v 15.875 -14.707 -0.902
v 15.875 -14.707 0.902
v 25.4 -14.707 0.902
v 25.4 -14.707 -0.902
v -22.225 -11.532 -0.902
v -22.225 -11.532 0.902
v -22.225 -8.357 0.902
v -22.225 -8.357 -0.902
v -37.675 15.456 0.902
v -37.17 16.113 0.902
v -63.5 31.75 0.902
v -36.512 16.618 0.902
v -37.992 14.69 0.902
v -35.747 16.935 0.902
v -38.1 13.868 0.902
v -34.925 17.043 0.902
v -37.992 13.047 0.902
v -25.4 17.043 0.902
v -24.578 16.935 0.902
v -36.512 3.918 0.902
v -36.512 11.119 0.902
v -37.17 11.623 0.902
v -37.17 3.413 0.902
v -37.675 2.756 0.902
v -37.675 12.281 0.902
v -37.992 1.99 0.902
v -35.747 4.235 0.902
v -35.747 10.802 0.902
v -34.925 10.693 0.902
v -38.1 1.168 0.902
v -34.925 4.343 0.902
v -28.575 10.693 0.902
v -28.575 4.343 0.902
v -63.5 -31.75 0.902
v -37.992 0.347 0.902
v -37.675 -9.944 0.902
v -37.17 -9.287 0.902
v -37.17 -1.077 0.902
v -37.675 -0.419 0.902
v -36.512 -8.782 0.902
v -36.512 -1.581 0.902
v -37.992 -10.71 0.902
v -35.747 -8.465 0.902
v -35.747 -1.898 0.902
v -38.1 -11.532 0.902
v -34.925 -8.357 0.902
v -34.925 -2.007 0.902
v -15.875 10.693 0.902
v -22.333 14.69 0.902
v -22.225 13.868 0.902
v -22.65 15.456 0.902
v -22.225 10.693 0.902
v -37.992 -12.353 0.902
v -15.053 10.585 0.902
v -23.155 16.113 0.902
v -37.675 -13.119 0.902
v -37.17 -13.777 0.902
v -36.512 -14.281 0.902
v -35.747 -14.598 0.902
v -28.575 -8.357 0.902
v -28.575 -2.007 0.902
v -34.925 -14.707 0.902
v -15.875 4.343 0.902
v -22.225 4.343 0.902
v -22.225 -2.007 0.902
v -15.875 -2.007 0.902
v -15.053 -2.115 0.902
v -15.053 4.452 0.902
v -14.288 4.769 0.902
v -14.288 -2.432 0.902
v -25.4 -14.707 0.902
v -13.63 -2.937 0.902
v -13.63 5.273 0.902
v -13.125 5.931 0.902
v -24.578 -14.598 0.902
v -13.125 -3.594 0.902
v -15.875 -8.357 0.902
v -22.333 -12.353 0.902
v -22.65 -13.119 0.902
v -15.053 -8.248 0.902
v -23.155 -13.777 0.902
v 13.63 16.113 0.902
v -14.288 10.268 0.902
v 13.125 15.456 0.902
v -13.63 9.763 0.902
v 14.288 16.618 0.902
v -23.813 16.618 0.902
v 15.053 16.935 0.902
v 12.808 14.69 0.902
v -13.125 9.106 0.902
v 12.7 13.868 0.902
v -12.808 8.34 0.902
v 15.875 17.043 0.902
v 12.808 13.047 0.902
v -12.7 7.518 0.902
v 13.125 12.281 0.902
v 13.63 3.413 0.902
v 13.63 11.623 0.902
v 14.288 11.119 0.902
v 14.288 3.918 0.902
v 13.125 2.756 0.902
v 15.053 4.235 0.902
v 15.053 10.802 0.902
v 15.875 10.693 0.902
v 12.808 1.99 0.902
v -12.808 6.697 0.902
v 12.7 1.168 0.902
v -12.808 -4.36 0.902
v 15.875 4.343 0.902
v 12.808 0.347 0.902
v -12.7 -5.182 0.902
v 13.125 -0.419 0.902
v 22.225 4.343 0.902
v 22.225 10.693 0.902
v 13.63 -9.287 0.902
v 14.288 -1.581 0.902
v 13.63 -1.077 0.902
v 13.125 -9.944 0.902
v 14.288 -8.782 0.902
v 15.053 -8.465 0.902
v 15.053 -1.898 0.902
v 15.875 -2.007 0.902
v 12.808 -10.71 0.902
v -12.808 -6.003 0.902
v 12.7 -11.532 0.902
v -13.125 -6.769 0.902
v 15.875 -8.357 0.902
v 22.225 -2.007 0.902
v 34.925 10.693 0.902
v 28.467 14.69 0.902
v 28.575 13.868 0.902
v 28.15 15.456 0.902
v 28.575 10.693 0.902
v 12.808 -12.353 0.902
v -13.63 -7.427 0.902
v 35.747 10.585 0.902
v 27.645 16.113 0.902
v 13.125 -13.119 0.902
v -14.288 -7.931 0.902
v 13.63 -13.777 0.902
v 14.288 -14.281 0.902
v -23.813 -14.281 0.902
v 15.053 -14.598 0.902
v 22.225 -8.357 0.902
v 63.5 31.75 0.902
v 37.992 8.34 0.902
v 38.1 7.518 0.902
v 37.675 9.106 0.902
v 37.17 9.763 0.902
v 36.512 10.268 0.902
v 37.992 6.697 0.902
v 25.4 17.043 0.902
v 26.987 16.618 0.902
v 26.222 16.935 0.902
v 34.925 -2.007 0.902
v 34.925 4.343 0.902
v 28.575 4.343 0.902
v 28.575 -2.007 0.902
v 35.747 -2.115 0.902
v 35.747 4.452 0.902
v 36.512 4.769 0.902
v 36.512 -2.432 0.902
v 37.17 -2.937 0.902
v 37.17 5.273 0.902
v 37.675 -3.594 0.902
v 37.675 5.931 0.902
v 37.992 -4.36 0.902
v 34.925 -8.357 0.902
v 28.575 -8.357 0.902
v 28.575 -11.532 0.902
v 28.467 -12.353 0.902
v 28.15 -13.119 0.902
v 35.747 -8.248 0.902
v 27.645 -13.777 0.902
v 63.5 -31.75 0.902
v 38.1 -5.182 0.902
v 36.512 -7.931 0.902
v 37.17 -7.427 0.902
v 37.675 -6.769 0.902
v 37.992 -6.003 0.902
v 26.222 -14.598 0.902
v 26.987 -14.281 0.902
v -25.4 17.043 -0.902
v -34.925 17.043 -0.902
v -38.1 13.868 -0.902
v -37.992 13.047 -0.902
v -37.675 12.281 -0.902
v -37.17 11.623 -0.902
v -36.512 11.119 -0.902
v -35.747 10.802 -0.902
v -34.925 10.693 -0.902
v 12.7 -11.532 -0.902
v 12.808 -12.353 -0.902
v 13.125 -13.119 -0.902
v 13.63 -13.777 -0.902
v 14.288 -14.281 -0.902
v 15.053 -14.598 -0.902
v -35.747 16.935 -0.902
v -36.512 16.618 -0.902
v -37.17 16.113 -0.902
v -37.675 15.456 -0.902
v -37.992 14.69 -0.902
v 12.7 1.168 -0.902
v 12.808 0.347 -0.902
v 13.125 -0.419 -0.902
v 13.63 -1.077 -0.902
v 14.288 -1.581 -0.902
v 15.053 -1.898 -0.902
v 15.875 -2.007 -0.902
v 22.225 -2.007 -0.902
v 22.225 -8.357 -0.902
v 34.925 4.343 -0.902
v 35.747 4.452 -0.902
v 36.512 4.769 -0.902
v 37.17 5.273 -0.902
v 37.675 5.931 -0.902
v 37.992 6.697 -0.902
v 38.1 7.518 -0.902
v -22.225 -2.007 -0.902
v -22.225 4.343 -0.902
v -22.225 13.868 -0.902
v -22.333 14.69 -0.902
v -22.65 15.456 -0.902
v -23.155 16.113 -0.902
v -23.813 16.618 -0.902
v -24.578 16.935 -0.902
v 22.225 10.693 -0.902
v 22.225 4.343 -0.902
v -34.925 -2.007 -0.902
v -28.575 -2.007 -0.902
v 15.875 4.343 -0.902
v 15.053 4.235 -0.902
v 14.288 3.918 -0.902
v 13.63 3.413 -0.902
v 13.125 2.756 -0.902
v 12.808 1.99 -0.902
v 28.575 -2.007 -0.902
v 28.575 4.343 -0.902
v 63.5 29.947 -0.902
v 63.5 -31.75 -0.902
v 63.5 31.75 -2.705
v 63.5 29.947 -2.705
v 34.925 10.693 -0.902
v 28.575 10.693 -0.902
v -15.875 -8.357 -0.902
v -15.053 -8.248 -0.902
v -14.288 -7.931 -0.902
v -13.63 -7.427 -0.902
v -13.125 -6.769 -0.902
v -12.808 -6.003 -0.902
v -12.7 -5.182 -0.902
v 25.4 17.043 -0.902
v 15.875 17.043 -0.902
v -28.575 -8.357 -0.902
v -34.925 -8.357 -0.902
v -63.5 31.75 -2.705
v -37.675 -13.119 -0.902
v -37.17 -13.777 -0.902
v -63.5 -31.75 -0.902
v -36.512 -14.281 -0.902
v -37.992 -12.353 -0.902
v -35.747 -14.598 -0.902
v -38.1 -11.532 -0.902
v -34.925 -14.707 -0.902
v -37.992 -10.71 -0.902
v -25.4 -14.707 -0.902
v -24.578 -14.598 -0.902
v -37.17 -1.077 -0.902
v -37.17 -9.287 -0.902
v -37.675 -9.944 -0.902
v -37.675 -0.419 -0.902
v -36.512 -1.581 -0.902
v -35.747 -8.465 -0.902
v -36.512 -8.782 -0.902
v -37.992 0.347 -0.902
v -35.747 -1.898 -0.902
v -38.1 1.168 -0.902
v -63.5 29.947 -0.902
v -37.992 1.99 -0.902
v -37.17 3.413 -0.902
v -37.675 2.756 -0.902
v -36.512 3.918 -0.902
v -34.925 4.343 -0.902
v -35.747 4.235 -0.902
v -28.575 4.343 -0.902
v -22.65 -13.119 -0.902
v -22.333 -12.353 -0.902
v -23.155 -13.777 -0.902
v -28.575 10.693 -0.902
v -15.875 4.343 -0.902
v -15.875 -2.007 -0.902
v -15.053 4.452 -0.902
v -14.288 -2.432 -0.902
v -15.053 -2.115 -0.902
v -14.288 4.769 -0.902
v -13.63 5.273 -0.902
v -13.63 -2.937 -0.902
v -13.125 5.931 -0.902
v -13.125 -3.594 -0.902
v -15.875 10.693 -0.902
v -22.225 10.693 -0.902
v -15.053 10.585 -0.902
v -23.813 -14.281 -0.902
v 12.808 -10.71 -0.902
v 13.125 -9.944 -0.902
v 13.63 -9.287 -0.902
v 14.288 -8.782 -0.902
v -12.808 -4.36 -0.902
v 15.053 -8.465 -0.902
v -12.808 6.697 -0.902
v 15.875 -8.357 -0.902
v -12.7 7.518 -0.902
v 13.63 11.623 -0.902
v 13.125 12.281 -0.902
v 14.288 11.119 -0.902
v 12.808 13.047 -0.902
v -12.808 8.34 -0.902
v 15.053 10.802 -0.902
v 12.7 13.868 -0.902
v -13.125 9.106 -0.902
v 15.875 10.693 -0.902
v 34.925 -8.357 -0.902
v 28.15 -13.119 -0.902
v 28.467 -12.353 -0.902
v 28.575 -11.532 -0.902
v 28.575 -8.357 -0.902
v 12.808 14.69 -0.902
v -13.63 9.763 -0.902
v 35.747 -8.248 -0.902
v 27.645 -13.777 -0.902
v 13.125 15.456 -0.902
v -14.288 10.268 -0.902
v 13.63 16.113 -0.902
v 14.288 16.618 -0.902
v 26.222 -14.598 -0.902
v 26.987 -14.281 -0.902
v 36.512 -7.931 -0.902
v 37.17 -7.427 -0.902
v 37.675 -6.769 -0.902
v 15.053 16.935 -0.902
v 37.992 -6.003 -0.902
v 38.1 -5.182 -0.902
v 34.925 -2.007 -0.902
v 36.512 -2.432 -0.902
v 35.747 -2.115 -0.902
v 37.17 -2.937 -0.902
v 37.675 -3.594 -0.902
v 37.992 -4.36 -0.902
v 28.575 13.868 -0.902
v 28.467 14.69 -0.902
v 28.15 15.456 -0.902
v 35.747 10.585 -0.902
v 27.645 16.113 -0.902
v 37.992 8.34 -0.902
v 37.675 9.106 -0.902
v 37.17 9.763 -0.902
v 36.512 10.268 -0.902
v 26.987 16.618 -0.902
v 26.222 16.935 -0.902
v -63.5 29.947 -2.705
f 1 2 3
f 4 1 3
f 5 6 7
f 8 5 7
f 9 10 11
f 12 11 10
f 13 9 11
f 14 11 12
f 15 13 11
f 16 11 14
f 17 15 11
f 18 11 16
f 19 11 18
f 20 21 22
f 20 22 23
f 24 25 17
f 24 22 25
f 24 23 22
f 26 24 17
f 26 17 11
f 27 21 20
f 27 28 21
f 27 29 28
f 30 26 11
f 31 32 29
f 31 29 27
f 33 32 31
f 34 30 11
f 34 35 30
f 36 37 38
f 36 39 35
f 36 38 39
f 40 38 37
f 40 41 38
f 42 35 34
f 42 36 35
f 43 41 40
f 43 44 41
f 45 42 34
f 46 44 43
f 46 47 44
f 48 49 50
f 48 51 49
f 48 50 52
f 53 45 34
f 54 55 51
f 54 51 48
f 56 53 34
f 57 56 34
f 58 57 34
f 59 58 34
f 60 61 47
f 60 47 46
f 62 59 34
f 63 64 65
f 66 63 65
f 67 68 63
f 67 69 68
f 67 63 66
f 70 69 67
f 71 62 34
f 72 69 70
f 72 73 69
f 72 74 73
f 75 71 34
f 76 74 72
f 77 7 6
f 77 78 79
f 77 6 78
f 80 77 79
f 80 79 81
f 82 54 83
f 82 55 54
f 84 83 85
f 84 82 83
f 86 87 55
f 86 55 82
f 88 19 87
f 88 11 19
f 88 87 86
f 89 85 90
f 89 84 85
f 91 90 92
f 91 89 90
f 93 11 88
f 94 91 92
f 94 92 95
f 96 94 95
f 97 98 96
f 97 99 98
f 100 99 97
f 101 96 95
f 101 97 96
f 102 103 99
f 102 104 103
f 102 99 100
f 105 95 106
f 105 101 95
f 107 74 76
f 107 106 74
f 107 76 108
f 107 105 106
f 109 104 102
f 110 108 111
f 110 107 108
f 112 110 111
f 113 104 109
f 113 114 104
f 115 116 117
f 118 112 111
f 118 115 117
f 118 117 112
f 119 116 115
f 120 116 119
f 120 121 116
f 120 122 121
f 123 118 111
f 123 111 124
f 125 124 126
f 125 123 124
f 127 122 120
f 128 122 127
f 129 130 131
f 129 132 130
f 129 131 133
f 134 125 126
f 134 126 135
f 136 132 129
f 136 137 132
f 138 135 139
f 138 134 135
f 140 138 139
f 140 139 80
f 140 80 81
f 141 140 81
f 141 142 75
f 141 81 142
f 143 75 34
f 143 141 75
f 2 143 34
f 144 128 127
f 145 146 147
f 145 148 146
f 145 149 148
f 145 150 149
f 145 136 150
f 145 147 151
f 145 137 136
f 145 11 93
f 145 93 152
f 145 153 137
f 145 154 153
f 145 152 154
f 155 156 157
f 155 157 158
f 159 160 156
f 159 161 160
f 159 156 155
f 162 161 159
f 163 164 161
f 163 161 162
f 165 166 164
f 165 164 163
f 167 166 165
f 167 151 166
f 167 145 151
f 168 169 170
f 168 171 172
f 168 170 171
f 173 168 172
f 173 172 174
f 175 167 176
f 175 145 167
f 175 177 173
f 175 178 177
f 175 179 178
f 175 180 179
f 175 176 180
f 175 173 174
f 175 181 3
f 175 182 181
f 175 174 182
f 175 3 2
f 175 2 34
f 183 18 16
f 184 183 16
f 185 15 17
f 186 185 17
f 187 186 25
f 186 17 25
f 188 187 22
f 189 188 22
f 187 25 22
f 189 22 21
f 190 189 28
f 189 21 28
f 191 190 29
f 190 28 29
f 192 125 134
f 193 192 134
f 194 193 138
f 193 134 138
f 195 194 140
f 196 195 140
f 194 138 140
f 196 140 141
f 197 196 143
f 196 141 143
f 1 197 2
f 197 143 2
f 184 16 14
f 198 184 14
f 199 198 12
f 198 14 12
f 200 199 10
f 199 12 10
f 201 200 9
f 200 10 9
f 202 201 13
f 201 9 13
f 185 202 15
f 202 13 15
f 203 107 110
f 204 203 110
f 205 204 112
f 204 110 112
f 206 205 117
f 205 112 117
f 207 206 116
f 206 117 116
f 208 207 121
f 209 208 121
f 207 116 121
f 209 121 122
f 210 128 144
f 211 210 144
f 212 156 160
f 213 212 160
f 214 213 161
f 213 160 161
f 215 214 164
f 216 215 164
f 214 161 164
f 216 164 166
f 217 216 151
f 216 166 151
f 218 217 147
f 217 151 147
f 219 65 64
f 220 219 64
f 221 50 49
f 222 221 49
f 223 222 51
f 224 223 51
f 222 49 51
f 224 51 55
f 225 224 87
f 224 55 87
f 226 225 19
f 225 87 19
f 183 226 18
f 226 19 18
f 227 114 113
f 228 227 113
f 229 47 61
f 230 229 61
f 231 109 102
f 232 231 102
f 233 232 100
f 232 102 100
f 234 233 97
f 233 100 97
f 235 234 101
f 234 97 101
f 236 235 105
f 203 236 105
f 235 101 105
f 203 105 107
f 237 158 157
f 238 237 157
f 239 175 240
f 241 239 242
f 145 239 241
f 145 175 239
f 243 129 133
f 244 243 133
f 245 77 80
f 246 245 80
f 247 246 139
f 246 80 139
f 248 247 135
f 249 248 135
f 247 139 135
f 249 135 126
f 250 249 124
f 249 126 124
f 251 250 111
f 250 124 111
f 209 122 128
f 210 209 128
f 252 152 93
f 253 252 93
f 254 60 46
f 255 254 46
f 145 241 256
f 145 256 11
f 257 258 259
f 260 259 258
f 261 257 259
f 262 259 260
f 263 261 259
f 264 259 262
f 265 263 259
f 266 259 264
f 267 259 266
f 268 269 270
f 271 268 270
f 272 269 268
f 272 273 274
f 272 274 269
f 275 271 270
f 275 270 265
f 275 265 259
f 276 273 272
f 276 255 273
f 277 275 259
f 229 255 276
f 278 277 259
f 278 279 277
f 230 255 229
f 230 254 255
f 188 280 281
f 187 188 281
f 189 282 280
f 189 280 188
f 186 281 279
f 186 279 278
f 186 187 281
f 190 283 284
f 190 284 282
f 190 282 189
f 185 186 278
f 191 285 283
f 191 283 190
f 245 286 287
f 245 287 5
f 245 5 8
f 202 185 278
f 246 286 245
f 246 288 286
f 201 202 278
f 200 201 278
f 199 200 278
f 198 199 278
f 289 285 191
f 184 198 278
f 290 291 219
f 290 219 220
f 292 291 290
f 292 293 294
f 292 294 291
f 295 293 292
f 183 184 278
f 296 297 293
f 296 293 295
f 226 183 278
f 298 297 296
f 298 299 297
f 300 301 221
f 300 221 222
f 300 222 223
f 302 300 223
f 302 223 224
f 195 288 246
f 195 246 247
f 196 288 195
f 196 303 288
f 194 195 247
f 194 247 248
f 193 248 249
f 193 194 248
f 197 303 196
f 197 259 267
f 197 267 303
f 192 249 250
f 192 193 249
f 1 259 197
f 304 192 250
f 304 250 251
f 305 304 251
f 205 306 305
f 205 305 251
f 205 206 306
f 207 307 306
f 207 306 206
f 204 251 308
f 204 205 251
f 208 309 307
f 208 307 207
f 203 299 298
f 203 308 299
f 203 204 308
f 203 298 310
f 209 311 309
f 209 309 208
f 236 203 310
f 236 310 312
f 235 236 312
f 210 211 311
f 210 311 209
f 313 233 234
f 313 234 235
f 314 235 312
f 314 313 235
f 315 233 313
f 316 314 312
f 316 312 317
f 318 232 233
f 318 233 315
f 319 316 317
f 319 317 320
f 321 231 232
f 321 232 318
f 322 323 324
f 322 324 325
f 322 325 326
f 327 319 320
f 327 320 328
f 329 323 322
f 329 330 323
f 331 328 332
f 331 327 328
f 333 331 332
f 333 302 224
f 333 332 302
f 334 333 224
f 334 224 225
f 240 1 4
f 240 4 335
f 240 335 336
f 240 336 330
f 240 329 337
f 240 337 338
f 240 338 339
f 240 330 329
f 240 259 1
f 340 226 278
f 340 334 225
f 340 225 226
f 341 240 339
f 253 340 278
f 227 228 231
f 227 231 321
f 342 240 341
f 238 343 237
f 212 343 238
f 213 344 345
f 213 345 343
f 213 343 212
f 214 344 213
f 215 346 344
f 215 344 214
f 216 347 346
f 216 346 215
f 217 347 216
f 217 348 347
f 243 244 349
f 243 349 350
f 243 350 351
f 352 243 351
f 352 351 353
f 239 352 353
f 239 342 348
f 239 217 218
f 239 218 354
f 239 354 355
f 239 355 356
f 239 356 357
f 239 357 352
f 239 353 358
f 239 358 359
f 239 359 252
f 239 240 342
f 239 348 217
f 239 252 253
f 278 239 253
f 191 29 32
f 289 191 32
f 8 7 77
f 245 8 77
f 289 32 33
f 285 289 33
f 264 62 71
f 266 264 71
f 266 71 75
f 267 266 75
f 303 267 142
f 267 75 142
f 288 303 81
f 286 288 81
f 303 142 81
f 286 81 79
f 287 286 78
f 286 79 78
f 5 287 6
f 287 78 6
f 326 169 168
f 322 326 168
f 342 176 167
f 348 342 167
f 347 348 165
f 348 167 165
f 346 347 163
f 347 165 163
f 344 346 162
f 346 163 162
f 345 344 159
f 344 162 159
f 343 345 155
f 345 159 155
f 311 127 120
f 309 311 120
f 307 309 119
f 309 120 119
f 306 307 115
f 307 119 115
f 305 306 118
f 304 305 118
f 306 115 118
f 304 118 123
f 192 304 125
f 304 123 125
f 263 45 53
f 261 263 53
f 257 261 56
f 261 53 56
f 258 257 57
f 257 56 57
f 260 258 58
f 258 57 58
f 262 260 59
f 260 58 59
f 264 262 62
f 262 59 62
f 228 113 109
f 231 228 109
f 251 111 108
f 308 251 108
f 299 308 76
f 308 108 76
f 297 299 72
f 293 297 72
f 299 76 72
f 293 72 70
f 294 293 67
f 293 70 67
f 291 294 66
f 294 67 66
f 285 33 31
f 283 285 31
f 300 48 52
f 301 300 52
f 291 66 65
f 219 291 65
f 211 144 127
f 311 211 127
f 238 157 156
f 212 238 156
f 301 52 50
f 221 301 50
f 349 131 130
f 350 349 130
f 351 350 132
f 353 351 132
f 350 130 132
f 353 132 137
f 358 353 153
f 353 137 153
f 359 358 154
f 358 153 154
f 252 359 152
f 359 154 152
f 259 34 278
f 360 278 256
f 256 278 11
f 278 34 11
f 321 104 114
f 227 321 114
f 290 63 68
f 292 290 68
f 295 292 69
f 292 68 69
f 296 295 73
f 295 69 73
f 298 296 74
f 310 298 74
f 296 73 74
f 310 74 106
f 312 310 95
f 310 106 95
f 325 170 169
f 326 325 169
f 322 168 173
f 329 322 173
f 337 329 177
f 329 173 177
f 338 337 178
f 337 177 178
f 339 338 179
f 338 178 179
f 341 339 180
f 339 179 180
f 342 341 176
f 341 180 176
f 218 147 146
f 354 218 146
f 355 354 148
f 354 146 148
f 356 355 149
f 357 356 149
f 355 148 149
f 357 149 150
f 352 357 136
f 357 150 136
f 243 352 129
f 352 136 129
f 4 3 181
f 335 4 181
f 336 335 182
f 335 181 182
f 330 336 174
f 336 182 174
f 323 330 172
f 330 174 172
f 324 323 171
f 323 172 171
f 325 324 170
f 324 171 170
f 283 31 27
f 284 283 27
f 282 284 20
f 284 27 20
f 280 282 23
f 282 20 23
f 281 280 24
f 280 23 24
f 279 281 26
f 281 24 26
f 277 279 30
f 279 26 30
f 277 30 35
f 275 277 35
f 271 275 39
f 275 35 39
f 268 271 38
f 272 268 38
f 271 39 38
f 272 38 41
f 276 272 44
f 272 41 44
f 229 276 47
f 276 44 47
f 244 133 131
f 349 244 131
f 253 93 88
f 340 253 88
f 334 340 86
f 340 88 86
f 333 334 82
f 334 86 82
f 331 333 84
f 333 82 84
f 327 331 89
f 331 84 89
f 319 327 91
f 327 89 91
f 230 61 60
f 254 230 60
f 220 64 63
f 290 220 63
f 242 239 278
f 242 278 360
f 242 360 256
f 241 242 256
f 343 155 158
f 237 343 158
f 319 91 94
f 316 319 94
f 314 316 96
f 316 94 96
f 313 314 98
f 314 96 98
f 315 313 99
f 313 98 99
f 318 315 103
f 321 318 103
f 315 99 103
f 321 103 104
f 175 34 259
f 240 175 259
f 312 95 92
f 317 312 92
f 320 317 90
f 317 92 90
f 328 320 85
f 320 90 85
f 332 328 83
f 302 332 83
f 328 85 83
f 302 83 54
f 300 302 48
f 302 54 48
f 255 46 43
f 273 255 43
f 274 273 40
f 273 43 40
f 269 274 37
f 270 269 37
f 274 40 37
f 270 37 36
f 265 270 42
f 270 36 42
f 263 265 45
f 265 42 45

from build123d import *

# Parameters (mm, degrees)
F1_DEPTH      = 63.5
F1_DEPTH_BACK = 63.5
F3_DEPTH      = 3.6078
F5_DEPTH      = 3.6078


with BuildPart() as f1:
    # F0 (on Right) → F1 (new body, two sides)
    with BuildSketch(Plane.YZ) as f1_sk:
        Polygon((-31.75, -0.9017), (29.9466, -0.9017), (29.9466, -2.7051), (31.75, -2.7051), (31.75, -0.9017), (31.75, 0.9017), (-31.75, 0.9017), align=None)
    extrude(amount=F1_DEPTH)
    extrude(f1_sk.sketch, amount=-F1_DEPTH_BACK)

    # F2 (on face) → F3 (cut, through all)
    with BuildSketch(Plane.XY.offset(0.9017)):
        with BuildLine():
            Line((-25.4, 17.0434), (-34.925, 17.0434))
            ThreePointArc((-34.925, 17.0434), (-37.170064, 16.113464), (-38.1, 13.8684))
            ThreePointArc((-38.1, 13.8684), (-37.170064, 11.623336), (-34.925, 10.6934))
            Line((-34.925, 10.6934), (-28.575, 10.6934))
            Line((-28.575, 10.6934), (-28.575, 4.3434))
            Line((-28.575, 4.3434), (-34.925, 4.3434))
            ThreePointArc((-34.925, 4.3434), (-37.170064, 3.413464), (-38.1, 1.1684))
            ThreePointArc((-38.1, 1.1684), (-37.170064, -1.076664), (-34.925, -2.0066))
            Line((-34.925, -2.0066), (-28.575, -2.0066))
            Line((-28.575, -2.0066), (-28.575, -8.3566))
            Line((-28.575, -8.3566), (-34.925, -8.3566))
            ThreePointArc((-34.925, -8.3566), (-37.170064, -9.286536), (-38.1, -11.5316))
            ThreePointArc((-38.1, -11.5316), (-37.170064, -13.776664), (-34.925, -14.7066))
            Line((-34.925, -14.7066), (-25.4, -14.7066))
            ThreePointArc((-25.4, -14.7066), (-23.154936, -13.776664), (-22.225, -11.5316))
            Line((-22.225, -11.5316), (-22.225, -8.3566))
            Line((-22.225, -8.3566), (-15.875, -8.3566))
            ThreePointArc((-15.875, -8.3566), (-13.629936, -7.426664), (-12.7, -5.1816))
            ThreePointArc((-12.7, -5.1816), (-13.629936, -2.936536), (-15.875, -2.0066))
            Line((-15.875, -2.0066), (-22.225, -2.0066))
            Line((-22.225, -2.0066), (-22.225, 4.3434))
            Line((-22.225, 4.3434), (-15.875, 4.3434))
            ThreePointArc((-15.875, 4.3434), (-13.629936, 5.273336), (-12.7, 7.5184))
            ThreePointArc((-12.7, 7.5184), (-13.629936, 9.763464), (-15.875, 10.6934))
            Line((-15.875, 10.6934), (-22.225, 10.6934))
            Line((-22.225, 10.6934), (-22.225, 13.8684))
            ThreePointArc((-22.225, 13.8684), (-23.154936, 16.113464), (-25.4, 17.0434))
        make_face()
    extrude(amount=-F3_DEPTH, mode=Mode.SUBTRACT)

    # F4 (on face) → F5 (cut, through all)
    with BuildSketch(Plane.XY.offset(0.9017)):
        with BuildLine():
            Line((25.4, 17.0434), (15.875, 17.0434))
            ThreePointArc((15.875, 17.0434), (13.629936, 16.113464), (12.7, 13.8684))
            ThreePointArc((12.7, 13.8684), (13.629936, 11.623336), (15.875, 10.6934))
            Line((15.875, 10.6934), (22.225, 10.6934))
            Line((22.225, 10.6934), (22.225, 4.3434))
            Line((22.225, 4.3434), (15.875, 4.3434))
            ThreePointArc((15.875, 4.3434), (13.629936, 3.413464), (12.7, 1.1684))
            ThreePointArc((12.7, 1.1684), (13.629936, -1.076664), (15.875, -2.0066))
            Line((15.875, -2.0066), (22.225, -2.0066))
            Line((22.225, -2.0066), (22.225, -8.3566))
            Line((22.225, -8.3566), (15.875, -8.3566))
            ThreePointArc((15.875, -8.3566), (13.629936, -9.286536), (12.7, -11.5316))
            ThreePointArc((12.7, -11.5316), (13.629936, -13.776664), (15.875, -14.7066))
            Line((15.875, -14.7066), (25.4, -14.7066))
            ThreePointArc((25.4, -14.7066), (27.645064, -13.776664), (28.575, -11.5316))
            Line((28.575, -11.5316), (28.575, -8.3566))
            Line((28.575, -8.3566), (34.925, -8.3566))
            ThreePointArc((34.925, -8.3566), (37.170064, -7.426664), (38.1, -5.1816))
            ThreePointArc((38.1, -5.1816), (37.170064, -2.936536), (34.925, -2.0066))
            Line((34.925, -2.0066), (28.575, -2.0066))
            Line((28.575, -2.0066), (28.575, 4.3434))
            Line((28.575, 4.3434), (34.925, 4.3434))
            ThreePointArc((34.925, 4.3434), (37.170064, 5.273336), (38.1, 7.5184))
            ThreePointArc((38.1, 7.5184), (37.170064, 9.763464), (34.925, 10.6934))
            Line((34.925, 10.6934), (28.575, 10.6934))
            Line((28.575, 10.6934), (28.575, 13.8684))
            ThreePointArc((28.575, 13.8684), (27.645064, 16.113464), (25.4, 17.0434))
        make_face()
    extrude(amount=-F5_DEPTH, mode=Mode.SUBTRACT)


solid = f1.part
